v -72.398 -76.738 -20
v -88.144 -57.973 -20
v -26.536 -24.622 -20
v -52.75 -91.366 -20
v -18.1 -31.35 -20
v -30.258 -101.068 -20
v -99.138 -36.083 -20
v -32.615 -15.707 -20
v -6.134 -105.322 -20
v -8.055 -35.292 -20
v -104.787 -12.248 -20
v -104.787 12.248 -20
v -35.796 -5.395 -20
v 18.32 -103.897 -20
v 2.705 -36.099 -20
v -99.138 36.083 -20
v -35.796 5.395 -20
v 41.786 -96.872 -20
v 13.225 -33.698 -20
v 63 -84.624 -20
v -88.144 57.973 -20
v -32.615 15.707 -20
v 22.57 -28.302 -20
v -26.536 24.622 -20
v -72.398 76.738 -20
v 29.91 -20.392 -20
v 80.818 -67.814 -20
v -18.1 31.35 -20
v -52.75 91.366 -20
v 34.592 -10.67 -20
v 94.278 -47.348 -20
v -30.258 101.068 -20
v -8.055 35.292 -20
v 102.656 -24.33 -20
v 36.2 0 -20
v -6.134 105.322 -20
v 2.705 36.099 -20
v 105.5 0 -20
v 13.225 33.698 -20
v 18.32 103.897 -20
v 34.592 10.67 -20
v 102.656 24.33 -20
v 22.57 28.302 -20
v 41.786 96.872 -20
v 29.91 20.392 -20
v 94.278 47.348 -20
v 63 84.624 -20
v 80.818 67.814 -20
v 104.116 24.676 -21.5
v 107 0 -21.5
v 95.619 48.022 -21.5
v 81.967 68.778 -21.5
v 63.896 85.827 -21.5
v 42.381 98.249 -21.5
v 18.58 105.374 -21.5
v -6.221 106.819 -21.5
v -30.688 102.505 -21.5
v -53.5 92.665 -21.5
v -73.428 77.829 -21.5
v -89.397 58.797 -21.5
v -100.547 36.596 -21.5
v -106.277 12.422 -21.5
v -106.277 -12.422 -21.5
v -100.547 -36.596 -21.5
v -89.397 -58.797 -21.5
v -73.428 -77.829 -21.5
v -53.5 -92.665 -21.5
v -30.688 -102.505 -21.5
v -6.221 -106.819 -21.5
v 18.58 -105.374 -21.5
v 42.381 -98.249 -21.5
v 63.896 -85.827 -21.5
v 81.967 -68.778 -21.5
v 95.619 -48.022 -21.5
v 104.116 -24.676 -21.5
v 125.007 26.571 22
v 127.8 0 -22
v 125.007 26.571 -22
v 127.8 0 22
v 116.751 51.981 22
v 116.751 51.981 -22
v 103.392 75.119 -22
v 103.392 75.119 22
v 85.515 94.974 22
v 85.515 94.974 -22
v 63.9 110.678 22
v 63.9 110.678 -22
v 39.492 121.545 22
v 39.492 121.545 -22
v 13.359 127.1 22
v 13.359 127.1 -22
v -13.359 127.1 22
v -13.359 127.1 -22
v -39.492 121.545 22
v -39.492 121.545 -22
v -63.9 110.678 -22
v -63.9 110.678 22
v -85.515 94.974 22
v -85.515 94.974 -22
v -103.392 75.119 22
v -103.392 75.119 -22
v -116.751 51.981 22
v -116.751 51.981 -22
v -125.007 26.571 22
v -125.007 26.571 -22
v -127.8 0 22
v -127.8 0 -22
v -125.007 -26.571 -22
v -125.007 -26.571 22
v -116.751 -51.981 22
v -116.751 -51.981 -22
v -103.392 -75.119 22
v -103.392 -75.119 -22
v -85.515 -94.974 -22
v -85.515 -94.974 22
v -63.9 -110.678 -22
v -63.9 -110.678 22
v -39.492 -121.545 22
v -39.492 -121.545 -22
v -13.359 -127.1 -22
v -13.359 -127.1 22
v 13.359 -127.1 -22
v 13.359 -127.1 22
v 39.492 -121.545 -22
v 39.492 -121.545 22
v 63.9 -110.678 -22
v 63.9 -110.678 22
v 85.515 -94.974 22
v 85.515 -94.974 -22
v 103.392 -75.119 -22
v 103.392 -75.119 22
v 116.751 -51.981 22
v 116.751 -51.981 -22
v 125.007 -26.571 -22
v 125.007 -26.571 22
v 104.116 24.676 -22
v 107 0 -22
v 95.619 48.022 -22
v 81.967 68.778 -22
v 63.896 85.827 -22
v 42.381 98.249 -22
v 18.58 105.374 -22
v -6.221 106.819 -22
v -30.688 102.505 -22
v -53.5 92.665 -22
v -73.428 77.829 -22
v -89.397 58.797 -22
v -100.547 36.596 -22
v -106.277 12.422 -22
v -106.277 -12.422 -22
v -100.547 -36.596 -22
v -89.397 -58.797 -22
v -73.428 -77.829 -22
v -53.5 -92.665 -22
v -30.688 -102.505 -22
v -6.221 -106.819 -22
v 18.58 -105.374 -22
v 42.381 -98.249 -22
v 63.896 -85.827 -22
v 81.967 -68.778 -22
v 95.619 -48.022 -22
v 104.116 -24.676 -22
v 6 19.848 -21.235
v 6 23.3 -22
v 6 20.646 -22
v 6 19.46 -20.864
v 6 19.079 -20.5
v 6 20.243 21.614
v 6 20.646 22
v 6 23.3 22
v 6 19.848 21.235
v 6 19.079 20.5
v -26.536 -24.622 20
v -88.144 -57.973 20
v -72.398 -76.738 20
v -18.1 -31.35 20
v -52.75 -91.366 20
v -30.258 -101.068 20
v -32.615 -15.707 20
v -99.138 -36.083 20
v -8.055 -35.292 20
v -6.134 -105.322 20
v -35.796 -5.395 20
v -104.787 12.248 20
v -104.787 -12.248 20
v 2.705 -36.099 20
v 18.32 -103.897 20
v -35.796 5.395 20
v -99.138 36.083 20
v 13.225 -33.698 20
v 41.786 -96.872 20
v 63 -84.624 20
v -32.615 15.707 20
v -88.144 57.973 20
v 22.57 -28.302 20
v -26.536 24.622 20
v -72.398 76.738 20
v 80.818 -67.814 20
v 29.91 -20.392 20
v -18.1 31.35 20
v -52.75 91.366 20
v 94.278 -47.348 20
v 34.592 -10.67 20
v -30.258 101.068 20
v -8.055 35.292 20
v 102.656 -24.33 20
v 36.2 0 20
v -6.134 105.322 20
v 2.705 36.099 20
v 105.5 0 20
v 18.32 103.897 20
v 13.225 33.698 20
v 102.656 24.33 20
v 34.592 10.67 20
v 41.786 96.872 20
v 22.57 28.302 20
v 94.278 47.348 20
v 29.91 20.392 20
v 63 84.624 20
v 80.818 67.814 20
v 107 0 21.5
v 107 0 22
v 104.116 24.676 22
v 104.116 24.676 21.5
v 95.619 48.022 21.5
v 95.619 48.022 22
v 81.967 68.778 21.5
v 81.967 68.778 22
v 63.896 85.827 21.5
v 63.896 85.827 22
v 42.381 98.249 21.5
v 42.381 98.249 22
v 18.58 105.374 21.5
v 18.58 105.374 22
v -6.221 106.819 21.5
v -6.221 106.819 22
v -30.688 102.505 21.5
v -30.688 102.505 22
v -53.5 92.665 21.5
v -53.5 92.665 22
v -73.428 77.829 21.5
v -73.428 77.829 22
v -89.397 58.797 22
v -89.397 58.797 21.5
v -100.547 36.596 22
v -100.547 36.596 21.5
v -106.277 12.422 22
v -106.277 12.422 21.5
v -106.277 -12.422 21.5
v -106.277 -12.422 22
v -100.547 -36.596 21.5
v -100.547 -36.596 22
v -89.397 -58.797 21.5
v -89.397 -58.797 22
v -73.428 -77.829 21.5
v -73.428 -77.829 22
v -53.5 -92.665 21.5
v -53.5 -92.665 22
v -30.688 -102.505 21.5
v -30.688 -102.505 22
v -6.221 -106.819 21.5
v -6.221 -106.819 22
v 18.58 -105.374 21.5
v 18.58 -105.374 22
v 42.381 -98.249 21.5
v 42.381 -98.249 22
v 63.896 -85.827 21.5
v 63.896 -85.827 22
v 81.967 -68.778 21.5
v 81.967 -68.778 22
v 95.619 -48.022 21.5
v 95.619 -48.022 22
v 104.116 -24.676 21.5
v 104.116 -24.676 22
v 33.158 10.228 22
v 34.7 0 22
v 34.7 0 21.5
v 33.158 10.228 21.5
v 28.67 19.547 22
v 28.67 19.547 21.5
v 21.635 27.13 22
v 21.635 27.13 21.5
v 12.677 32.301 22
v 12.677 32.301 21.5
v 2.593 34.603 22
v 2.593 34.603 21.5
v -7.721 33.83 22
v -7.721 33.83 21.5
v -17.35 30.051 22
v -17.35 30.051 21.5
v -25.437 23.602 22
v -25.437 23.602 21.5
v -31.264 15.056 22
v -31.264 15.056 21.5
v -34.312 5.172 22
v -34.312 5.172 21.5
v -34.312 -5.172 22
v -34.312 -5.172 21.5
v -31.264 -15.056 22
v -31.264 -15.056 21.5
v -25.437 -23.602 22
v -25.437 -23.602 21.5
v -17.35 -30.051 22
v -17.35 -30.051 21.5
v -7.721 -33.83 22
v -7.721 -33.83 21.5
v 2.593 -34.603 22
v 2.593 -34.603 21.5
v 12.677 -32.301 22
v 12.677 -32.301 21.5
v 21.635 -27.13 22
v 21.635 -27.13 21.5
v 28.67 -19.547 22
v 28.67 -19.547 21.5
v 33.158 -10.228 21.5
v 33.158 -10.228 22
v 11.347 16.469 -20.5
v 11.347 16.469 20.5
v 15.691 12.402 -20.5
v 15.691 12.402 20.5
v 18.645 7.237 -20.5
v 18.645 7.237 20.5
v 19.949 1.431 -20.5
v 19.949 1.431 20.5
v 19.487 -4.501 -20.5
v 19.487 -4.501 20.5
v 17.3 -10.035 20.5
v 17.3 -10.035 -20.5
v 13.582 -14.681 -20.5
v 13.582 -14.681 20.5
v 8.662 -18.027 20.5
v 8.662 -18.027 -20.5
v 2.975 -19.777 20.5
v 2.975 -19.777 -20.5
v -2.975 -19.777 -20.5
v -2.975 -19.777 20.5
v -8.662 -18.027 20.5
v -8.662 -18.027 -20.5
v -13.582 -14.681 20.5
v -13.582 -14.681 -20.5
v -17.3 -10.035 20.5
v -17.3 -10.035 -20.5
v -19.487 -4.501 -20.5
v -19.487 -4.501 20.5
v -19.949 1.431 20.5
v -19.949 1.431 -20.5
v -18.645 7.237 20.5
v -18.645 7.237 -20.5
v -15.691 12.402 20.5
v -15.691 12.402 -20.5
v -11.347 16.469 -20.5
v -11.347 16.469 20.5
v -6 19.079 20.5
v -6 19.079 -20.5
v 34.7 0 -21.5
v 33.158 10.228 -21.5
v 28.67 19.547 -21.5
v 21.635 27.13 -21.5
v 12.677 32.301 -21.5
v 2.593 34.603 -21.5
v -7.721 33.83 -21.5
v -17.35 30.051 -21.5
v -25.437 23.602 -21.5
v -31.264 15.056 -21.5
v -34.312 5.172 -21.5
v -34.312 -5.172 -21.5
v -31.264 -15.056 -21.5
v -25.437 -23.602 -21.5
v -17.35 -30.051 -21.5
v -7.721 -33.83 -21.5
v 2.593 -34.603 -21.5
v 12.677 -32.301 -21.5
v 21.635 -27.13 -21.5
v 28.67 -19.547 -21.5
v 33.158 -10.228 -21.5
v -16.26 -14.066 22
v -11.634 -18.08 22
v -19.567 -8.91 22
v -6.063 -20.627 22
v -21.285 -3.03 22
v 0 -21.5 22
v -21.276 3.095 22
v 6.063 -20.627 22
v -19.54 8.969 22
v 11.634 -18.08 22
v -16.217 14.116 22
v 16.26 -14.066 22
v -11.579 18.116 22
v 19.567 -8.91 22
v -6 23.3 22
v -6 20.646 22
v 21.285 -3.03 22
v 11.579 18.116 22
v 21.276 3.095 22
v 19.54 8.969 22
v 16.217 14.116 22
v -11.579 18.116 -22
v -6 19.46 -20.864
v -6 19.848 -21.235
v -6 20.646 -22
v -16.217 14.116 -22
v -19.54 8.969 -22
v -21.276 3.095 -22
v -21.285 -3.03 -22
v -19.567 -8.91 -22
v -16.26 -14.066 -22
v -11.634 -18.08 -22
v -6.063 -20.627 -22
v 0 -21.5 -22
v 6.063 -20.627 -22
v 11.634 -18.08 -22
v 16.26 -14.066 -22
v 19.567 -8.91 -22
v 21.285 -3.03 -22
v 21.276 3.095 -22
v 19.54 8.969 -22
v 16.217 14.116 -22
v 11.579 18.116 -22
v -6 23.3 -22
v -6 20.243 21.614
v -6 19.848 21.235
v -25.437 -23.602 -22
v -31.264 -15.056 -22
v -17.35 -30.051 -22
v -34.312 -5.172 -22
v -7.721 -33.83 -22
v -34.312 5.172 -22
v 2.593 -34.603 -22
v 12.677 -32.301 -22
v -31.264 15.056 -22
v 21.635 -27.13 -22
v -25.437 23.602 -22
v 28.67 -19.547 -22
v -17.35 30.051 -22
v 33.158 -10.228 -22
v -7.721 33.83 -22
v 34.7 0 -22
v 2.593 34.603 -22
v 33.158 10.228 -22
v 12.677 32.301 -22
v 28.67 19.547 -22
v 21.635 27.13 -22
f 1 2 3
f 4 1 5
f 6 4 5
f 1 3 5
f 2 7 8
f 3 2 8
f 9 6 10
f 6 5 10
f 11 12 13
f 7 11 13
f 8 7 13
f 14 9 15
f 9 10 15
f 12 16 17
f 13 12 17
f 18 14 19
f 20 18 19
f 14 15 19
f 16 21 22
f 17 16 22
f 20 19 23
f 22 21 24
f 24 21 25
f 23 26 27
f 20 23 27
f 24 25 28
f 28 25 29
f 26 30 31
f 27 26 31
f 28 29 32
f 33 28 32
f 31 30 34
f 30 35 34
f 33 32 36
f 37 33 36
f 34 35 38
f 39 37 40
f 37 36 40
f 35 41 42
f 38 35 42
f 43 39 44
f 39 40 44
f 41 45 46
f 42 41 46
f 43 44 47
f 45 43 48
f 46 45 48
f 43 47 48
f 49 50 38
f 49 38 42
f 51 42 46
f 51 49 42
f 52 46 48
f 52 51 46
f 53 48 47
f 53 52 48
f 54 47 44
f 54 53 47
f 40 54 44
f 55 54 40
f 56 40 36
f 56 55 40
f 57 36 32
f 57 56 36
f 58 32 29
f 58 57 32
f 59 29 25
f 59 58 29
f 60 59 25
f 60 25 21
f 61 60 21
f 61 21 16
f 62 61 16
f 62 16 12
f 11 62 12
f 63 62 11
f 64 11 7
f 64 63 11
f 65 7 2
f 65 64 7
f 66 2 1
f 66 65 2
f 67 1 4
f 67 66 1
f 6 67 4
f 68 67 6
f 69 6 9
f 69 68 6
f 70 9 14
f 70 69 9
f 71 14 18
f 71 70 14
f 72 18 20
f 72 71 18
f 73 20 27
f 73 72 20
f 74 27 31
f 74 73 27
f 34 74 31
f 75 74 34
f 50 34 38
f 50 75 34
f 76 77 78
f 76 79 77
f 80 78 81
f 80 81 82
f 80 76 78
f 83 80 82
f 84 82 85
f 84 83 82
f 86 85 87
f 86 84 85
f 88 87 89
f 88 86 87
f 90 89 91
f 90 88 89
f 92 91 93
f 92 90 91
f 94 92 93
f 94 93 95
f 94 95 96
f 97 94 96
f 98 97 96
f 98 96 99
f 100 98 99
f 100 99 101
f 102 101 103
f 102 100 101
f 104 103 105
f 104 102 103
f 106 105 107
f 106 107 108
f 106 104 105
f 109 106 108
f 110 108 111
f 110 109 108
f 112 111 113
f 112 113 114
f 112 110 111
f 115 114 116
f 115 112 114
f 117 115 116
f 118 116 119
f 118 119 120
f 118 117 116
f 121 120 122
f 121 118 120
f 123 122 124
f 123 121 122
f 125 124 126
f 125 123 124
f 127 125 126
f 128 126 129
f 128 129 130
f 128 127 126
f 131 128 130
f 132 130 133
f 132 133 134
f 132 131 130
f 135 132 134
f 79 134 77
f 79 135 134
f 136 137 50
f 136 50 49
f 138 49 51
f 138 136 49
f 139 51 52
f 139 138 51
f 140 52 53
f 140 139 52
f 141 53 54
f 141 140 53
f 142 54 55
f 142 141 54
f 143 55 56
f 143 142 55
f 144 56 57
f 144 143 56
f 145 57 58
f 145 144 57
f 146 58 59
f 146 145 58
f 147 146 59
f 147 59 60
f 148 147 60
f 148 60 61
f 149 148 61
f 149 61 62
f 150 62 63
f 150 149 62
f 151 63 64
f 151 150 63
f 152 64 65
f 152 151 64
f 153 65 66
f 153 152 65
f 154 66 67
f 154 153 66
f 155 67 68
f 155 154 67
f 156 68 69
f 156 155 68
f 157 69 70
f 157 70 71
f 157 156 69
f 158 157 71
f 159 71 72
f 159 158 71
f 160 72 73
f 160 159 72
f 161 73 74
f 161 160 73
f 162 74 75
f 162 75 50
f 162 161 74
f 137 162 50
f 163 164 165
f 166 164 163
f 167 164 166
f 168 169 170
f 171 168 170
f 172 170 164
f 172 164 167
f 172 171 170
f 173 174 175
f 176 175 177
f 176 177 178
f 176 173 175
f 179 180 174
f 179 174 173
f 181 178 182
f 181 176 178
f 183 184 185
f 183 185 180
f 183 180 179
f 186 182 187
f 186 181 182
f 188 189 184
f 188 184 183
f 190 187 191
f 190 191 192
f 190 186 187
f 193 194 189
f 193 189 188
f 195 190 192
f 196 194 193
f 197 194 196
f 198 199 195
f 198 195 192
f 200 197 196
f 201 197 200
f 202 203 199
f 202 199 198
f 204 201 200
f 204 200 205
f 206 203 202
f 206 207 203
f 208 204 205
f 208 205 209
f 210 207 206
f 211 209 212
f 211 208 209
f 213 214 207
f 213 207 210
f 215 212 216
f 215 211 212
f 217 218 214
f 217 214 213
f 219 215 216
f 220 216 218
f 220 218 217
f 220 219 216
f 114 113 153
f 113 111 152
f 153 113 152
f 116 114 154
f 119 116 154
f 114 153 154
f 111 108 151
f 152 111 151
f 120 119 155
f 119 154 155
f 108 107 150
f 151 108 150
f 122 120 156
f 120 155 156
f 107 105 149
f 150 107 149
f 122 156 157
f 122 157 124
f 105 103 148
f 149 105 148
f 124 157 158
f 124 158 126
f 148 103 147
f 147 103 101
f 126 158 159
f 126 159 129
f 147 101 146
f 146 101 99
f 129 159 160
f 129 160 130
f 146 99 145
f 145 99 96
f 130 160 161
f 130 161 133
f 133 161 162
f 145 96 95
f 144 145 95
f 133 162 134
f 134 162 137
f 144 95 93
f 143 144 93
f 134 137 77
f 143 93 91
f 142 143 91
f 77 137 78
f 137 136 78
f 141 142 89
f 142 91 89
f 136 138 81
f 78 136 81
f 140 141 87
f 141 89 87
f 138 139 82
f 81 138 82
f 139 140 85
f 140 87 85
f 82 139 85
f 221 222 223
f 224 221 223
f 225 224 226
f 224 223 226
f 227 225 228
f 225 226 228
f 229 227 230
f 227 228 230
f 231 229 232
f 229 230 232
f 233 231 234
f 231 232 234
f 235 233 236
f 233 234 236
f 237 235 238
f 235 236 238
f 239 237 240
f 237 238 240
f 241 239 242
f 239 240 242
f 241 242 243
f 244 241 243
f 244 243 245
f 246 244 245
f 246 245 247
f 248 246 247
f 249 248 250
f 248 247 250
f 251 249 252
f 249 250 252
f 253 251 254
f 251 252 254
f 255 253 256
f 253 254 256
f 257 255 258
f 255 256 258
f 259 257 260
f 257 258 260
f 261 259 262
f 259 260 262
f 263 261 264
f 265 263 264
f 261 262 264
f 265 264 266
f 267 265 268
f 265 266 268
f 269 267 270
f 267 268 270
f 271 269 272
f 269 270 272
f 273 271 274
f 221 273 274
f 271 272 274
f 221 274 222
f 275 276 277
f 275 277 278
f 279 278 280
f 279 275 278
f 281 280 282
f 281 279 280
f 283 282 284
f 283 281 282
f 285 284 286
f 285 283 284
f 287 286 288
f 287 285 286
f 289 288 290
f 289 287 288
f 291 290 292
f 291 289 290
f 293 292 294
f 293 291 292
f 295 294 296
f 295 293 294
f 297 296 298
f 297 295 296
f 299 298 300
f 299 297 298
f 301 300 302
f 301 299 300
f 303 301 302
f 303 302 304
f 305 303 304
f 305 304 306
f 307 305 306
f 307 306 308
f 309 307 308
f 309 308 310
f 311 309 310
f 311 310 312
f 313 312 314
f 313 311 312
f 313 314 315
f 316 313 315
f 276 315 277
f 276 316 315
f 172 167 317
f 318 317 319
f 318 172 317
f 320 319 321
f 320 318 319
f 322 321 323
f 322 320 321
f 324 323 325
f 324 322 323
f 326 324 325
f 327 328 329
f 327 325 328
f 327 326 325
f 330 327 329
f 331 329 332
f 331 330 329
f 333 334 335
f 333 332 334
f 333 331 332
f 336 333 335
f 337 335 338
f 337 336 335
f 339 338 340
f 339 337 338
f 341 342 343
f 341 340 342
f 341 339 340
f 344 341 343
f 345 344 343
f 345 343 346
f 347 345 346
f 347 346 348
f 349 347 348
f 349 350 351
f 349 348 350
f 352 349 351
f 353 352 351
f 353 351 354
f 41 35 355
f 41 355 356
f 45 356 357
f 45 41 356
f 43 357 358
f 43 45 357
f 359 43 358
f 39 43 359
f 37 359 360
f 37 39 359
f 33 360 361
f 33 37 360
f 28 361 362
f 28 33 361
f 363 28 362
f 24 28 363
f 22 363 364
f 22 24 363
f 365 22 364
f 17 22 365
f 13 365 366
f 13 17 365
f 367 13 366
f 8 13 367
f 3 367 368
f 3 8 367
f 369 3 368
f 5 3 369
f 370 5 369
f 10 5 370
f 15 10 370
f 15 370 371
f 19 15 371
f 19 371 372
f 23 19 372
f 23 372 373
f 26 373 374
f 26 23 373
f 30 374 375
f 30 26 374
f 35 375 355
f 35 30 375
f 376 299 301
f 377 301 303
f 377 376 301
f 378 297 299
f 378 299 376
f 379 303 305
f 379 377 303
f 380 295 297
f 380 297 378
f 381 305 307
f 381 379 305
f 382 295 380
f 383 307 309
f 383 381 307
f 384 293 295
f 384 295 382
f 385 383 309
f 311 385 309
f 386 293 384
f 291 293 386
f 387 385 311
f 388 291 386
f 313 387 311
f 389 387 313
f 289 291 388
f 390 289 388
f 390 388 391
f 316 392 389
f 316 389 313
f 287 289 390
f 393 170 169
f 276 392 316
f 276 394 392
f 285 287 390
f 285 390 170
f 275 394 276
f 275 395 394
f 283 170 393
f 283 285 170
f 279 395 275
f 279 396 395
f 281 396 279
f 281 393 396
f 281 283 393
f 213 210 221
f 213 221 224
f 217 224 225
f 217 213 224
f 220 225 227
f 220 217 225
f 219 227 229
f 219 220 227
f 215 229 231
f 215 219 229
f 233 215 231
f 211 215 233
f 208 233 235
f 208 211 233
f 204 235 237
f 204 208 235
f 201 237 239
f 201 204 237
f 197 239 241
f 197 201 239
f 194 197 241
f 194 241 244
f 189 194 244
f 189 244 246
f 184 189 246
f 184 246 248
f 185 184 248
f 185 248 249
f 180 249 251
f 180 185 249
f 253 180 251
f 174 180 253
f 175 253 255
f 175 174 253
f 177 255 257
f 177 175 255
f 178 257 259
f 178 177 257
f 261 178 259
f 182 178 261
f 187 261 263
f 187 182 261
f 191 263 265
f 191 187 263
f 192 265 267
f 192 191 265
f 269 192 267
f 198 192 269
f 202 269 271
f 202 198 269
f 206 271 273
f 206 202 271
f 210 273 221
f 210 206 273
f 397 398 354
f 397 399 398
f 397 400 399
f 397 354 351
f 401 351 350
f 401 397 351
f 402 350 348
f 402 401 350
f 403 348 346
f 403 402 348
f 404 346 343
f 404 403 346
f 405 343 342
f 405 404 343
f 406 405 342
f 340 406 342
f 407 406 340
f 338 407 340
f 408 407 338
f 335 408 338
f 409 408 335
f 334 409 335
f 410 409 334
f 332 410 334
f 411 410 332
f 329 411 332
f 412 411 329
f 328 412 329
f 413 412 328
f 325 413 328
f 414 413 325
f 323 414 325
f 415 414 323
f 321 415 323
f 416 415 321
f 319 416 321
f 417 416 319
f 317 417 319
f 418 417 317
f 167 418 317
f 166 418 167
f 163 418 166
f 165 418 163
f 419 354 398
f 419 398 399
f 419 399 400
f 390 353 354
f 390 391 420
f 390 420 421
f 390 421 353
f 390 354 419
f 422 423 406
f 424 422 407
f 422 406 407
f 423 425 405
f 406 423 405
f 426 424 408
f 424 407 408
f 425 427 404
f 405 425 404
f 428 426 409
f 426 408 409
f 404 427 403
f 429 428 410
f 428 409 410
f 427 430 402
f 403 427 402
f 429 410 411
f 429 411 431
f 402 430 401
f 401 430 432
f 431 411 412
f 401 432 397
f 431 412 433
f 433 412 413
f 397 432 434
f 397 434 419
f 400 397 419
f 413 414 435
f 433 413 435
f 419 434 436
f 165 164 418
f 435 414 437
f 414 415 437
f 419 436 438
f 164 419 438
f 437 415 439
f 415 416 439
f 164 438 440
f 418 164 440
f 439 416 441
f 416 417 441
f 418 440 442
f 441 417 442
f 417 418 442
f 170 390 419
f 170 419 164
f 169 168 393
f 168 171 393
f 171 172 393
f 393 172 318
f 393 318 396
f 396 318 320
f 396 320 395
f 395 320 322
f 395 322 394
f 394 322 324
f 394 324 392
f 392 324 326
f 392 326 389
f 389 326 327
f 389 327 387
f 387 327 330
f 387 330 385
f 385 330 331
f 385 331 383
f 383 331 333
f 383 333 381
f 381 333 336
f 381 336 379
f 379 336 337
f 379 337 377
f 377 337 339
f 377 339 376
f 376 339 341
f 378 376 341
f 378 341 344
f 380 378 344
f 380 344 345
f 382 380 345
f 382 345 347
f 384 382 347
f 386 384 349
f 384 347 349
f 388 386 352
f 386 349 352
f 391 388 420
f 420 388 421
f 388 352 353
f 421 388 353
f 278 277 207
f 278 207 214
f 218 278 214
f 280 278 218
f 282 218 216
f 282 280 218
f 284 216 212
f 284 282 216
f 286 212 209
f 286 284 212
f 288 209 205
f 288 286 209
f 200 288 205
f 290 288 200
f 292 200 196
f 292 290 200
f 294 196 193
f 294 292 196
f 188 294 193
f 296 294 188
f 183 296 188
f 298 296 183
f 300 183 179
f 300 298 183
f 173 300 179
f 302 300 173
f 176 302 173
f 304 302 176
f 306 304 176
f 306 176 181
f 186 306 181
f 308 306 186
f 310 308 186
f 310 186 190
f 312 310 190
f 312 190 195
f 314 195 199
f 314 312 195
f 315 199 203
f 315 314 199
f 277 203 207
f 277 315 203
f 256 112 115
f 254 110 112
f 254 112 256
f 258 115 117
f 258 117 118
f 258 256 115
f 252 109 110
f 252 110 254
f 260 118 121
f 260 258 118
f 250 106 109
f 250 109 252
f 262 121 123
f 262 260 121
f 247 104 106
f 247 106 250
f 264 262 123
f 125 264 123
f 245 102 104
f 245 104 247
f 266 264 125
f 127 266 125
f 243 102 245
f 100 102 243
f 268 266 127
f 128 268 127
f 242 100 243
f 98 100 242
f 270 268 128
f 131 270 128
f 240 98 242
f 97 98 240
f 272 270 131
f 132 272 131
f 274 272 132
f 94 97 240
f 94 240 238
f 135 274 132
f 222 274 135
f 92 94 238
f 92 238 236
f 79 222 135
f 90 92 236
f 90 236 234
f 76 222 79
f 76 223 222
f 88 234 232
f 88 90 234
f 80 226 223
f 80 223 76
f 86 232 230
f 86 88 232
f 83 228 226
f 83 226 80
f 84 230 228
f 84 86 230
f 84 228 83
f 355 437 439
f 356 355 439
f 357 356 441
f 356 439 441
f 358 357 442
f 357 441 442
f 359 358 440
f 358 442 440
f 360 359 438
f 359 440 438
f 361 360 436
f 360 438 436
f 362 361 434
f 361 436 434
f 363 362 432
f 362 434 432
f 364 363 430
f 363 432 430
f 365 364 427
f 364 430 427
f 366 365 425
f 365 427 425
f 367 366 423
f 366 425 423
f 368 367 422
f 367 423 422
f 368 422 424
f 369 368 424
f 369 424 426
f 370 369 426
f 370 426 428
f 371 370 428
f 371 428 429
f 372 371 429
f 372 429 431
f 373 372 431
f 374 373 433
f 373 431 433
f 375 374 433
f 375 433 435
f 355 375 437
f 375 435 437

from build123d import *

# Parameters (mm, degrees)
SKETCH3_R               = 127.8
BOSS_EXTRUDE1_DEPTH     = 22
CUT_EXTRUDE1_DEPTH      = 1
CUT_EXTRUDE1_DEPTH_BACK = 45
SKETCH7_R               = 107
SKETCH7_R_2             = 34.7
CUT_EXTRUDE2_DEPTH      = 2
CHAMFER1_SIZE           = 1.5
CHAMFER2_SIZE           = 1.5
CHAMFER3_SIZE           = 1.5
CHAMFER4_SIZE           = 1.5


with BuildPart() as part:
    # Sketch3 → Boss-Extrude1 (new body, symmetric)
    with BuildSketch(Plane.XY):
        Circle(SKETCH3_R)
    extrude(amount=BOSS_EXTRUDE1_DEPTH, both=True)

    # Sketch6 → Cut-Extrude1 (cut, two sides)
    with BuildSketch(Plane.XY.offset(22)) as cut_extrude1_sk:
        with BuildLine():
            Line((-6, 19.078784028), (-6, 23.3))
            Line((-6, 23.3), (6, 23.3))
            Line((6, 23.3), (6, 19.078784028))
            ThreePointArc((6, 19.078784028), (0, -20), (-6, 19.078784028))
        make_face()
    extrude(amount=CUT_EXTRUDE1_DEPTH, mode=Mode.SUBTRACT)
    extrude(cut_extrude1_sk.sketch, amount=-CUT_EXTRUDE1_DEPTH_BACK, mode=Mode.SUBTRACT)

    # Sketch7 → Cut-Extrude2 (cut)
    with BuildSketch(Plane.XY.offset(22)):
        Circle(SKETCH7_R)
        Circle(SKETCH7_R_2, mode=Mode.SUBTRACT)
    cut_extrude2 = extrude(amount=-CUT_EXTRUDE2_DEPTH, mode=Mode.SUBTRACT)

    # Mirror1: Cut-Extrude2 across plane
    add(cut_extrude2.mirror(Plane.XY), mode=Mode.SUBTRACT)

    # Chamfer1
    chamfer1_edges = [part.edges().sort_by_distance(p)[0] for p in [
        (-107, 0, 20),
    ]]
    chamfer(chamfer1_edges, length=CHAMFER1_SIZE)

    # Chamfer2
    chamfer2_edges = [part.edges().sort_by_distance(p)[0] for p in [
        (-34.7, 0, 20),
    ]]
    chamfer(chamfer2_edges, length=CHAMFER2_SIZE)

    # Chamfer3
    chamfer3_edges = [part.edges().sort_by_distance(p)[0] for p in [
        (0, -20, 22),
    ]]
    chamfer(chamfer3_edges, length=CHAMFER3_SIZE)

    # Chamfer4
    chamfer4_edges = [part.edges().sort_by_distance(p)[0] for p in [
        (0, -20, -22),
        (-107, 0, -20),
        (-34.7, 0, -20),
    ]]
    chamfer(chamfer4_edges, length=CHAMFER4_SIZE)


solid = part.part
